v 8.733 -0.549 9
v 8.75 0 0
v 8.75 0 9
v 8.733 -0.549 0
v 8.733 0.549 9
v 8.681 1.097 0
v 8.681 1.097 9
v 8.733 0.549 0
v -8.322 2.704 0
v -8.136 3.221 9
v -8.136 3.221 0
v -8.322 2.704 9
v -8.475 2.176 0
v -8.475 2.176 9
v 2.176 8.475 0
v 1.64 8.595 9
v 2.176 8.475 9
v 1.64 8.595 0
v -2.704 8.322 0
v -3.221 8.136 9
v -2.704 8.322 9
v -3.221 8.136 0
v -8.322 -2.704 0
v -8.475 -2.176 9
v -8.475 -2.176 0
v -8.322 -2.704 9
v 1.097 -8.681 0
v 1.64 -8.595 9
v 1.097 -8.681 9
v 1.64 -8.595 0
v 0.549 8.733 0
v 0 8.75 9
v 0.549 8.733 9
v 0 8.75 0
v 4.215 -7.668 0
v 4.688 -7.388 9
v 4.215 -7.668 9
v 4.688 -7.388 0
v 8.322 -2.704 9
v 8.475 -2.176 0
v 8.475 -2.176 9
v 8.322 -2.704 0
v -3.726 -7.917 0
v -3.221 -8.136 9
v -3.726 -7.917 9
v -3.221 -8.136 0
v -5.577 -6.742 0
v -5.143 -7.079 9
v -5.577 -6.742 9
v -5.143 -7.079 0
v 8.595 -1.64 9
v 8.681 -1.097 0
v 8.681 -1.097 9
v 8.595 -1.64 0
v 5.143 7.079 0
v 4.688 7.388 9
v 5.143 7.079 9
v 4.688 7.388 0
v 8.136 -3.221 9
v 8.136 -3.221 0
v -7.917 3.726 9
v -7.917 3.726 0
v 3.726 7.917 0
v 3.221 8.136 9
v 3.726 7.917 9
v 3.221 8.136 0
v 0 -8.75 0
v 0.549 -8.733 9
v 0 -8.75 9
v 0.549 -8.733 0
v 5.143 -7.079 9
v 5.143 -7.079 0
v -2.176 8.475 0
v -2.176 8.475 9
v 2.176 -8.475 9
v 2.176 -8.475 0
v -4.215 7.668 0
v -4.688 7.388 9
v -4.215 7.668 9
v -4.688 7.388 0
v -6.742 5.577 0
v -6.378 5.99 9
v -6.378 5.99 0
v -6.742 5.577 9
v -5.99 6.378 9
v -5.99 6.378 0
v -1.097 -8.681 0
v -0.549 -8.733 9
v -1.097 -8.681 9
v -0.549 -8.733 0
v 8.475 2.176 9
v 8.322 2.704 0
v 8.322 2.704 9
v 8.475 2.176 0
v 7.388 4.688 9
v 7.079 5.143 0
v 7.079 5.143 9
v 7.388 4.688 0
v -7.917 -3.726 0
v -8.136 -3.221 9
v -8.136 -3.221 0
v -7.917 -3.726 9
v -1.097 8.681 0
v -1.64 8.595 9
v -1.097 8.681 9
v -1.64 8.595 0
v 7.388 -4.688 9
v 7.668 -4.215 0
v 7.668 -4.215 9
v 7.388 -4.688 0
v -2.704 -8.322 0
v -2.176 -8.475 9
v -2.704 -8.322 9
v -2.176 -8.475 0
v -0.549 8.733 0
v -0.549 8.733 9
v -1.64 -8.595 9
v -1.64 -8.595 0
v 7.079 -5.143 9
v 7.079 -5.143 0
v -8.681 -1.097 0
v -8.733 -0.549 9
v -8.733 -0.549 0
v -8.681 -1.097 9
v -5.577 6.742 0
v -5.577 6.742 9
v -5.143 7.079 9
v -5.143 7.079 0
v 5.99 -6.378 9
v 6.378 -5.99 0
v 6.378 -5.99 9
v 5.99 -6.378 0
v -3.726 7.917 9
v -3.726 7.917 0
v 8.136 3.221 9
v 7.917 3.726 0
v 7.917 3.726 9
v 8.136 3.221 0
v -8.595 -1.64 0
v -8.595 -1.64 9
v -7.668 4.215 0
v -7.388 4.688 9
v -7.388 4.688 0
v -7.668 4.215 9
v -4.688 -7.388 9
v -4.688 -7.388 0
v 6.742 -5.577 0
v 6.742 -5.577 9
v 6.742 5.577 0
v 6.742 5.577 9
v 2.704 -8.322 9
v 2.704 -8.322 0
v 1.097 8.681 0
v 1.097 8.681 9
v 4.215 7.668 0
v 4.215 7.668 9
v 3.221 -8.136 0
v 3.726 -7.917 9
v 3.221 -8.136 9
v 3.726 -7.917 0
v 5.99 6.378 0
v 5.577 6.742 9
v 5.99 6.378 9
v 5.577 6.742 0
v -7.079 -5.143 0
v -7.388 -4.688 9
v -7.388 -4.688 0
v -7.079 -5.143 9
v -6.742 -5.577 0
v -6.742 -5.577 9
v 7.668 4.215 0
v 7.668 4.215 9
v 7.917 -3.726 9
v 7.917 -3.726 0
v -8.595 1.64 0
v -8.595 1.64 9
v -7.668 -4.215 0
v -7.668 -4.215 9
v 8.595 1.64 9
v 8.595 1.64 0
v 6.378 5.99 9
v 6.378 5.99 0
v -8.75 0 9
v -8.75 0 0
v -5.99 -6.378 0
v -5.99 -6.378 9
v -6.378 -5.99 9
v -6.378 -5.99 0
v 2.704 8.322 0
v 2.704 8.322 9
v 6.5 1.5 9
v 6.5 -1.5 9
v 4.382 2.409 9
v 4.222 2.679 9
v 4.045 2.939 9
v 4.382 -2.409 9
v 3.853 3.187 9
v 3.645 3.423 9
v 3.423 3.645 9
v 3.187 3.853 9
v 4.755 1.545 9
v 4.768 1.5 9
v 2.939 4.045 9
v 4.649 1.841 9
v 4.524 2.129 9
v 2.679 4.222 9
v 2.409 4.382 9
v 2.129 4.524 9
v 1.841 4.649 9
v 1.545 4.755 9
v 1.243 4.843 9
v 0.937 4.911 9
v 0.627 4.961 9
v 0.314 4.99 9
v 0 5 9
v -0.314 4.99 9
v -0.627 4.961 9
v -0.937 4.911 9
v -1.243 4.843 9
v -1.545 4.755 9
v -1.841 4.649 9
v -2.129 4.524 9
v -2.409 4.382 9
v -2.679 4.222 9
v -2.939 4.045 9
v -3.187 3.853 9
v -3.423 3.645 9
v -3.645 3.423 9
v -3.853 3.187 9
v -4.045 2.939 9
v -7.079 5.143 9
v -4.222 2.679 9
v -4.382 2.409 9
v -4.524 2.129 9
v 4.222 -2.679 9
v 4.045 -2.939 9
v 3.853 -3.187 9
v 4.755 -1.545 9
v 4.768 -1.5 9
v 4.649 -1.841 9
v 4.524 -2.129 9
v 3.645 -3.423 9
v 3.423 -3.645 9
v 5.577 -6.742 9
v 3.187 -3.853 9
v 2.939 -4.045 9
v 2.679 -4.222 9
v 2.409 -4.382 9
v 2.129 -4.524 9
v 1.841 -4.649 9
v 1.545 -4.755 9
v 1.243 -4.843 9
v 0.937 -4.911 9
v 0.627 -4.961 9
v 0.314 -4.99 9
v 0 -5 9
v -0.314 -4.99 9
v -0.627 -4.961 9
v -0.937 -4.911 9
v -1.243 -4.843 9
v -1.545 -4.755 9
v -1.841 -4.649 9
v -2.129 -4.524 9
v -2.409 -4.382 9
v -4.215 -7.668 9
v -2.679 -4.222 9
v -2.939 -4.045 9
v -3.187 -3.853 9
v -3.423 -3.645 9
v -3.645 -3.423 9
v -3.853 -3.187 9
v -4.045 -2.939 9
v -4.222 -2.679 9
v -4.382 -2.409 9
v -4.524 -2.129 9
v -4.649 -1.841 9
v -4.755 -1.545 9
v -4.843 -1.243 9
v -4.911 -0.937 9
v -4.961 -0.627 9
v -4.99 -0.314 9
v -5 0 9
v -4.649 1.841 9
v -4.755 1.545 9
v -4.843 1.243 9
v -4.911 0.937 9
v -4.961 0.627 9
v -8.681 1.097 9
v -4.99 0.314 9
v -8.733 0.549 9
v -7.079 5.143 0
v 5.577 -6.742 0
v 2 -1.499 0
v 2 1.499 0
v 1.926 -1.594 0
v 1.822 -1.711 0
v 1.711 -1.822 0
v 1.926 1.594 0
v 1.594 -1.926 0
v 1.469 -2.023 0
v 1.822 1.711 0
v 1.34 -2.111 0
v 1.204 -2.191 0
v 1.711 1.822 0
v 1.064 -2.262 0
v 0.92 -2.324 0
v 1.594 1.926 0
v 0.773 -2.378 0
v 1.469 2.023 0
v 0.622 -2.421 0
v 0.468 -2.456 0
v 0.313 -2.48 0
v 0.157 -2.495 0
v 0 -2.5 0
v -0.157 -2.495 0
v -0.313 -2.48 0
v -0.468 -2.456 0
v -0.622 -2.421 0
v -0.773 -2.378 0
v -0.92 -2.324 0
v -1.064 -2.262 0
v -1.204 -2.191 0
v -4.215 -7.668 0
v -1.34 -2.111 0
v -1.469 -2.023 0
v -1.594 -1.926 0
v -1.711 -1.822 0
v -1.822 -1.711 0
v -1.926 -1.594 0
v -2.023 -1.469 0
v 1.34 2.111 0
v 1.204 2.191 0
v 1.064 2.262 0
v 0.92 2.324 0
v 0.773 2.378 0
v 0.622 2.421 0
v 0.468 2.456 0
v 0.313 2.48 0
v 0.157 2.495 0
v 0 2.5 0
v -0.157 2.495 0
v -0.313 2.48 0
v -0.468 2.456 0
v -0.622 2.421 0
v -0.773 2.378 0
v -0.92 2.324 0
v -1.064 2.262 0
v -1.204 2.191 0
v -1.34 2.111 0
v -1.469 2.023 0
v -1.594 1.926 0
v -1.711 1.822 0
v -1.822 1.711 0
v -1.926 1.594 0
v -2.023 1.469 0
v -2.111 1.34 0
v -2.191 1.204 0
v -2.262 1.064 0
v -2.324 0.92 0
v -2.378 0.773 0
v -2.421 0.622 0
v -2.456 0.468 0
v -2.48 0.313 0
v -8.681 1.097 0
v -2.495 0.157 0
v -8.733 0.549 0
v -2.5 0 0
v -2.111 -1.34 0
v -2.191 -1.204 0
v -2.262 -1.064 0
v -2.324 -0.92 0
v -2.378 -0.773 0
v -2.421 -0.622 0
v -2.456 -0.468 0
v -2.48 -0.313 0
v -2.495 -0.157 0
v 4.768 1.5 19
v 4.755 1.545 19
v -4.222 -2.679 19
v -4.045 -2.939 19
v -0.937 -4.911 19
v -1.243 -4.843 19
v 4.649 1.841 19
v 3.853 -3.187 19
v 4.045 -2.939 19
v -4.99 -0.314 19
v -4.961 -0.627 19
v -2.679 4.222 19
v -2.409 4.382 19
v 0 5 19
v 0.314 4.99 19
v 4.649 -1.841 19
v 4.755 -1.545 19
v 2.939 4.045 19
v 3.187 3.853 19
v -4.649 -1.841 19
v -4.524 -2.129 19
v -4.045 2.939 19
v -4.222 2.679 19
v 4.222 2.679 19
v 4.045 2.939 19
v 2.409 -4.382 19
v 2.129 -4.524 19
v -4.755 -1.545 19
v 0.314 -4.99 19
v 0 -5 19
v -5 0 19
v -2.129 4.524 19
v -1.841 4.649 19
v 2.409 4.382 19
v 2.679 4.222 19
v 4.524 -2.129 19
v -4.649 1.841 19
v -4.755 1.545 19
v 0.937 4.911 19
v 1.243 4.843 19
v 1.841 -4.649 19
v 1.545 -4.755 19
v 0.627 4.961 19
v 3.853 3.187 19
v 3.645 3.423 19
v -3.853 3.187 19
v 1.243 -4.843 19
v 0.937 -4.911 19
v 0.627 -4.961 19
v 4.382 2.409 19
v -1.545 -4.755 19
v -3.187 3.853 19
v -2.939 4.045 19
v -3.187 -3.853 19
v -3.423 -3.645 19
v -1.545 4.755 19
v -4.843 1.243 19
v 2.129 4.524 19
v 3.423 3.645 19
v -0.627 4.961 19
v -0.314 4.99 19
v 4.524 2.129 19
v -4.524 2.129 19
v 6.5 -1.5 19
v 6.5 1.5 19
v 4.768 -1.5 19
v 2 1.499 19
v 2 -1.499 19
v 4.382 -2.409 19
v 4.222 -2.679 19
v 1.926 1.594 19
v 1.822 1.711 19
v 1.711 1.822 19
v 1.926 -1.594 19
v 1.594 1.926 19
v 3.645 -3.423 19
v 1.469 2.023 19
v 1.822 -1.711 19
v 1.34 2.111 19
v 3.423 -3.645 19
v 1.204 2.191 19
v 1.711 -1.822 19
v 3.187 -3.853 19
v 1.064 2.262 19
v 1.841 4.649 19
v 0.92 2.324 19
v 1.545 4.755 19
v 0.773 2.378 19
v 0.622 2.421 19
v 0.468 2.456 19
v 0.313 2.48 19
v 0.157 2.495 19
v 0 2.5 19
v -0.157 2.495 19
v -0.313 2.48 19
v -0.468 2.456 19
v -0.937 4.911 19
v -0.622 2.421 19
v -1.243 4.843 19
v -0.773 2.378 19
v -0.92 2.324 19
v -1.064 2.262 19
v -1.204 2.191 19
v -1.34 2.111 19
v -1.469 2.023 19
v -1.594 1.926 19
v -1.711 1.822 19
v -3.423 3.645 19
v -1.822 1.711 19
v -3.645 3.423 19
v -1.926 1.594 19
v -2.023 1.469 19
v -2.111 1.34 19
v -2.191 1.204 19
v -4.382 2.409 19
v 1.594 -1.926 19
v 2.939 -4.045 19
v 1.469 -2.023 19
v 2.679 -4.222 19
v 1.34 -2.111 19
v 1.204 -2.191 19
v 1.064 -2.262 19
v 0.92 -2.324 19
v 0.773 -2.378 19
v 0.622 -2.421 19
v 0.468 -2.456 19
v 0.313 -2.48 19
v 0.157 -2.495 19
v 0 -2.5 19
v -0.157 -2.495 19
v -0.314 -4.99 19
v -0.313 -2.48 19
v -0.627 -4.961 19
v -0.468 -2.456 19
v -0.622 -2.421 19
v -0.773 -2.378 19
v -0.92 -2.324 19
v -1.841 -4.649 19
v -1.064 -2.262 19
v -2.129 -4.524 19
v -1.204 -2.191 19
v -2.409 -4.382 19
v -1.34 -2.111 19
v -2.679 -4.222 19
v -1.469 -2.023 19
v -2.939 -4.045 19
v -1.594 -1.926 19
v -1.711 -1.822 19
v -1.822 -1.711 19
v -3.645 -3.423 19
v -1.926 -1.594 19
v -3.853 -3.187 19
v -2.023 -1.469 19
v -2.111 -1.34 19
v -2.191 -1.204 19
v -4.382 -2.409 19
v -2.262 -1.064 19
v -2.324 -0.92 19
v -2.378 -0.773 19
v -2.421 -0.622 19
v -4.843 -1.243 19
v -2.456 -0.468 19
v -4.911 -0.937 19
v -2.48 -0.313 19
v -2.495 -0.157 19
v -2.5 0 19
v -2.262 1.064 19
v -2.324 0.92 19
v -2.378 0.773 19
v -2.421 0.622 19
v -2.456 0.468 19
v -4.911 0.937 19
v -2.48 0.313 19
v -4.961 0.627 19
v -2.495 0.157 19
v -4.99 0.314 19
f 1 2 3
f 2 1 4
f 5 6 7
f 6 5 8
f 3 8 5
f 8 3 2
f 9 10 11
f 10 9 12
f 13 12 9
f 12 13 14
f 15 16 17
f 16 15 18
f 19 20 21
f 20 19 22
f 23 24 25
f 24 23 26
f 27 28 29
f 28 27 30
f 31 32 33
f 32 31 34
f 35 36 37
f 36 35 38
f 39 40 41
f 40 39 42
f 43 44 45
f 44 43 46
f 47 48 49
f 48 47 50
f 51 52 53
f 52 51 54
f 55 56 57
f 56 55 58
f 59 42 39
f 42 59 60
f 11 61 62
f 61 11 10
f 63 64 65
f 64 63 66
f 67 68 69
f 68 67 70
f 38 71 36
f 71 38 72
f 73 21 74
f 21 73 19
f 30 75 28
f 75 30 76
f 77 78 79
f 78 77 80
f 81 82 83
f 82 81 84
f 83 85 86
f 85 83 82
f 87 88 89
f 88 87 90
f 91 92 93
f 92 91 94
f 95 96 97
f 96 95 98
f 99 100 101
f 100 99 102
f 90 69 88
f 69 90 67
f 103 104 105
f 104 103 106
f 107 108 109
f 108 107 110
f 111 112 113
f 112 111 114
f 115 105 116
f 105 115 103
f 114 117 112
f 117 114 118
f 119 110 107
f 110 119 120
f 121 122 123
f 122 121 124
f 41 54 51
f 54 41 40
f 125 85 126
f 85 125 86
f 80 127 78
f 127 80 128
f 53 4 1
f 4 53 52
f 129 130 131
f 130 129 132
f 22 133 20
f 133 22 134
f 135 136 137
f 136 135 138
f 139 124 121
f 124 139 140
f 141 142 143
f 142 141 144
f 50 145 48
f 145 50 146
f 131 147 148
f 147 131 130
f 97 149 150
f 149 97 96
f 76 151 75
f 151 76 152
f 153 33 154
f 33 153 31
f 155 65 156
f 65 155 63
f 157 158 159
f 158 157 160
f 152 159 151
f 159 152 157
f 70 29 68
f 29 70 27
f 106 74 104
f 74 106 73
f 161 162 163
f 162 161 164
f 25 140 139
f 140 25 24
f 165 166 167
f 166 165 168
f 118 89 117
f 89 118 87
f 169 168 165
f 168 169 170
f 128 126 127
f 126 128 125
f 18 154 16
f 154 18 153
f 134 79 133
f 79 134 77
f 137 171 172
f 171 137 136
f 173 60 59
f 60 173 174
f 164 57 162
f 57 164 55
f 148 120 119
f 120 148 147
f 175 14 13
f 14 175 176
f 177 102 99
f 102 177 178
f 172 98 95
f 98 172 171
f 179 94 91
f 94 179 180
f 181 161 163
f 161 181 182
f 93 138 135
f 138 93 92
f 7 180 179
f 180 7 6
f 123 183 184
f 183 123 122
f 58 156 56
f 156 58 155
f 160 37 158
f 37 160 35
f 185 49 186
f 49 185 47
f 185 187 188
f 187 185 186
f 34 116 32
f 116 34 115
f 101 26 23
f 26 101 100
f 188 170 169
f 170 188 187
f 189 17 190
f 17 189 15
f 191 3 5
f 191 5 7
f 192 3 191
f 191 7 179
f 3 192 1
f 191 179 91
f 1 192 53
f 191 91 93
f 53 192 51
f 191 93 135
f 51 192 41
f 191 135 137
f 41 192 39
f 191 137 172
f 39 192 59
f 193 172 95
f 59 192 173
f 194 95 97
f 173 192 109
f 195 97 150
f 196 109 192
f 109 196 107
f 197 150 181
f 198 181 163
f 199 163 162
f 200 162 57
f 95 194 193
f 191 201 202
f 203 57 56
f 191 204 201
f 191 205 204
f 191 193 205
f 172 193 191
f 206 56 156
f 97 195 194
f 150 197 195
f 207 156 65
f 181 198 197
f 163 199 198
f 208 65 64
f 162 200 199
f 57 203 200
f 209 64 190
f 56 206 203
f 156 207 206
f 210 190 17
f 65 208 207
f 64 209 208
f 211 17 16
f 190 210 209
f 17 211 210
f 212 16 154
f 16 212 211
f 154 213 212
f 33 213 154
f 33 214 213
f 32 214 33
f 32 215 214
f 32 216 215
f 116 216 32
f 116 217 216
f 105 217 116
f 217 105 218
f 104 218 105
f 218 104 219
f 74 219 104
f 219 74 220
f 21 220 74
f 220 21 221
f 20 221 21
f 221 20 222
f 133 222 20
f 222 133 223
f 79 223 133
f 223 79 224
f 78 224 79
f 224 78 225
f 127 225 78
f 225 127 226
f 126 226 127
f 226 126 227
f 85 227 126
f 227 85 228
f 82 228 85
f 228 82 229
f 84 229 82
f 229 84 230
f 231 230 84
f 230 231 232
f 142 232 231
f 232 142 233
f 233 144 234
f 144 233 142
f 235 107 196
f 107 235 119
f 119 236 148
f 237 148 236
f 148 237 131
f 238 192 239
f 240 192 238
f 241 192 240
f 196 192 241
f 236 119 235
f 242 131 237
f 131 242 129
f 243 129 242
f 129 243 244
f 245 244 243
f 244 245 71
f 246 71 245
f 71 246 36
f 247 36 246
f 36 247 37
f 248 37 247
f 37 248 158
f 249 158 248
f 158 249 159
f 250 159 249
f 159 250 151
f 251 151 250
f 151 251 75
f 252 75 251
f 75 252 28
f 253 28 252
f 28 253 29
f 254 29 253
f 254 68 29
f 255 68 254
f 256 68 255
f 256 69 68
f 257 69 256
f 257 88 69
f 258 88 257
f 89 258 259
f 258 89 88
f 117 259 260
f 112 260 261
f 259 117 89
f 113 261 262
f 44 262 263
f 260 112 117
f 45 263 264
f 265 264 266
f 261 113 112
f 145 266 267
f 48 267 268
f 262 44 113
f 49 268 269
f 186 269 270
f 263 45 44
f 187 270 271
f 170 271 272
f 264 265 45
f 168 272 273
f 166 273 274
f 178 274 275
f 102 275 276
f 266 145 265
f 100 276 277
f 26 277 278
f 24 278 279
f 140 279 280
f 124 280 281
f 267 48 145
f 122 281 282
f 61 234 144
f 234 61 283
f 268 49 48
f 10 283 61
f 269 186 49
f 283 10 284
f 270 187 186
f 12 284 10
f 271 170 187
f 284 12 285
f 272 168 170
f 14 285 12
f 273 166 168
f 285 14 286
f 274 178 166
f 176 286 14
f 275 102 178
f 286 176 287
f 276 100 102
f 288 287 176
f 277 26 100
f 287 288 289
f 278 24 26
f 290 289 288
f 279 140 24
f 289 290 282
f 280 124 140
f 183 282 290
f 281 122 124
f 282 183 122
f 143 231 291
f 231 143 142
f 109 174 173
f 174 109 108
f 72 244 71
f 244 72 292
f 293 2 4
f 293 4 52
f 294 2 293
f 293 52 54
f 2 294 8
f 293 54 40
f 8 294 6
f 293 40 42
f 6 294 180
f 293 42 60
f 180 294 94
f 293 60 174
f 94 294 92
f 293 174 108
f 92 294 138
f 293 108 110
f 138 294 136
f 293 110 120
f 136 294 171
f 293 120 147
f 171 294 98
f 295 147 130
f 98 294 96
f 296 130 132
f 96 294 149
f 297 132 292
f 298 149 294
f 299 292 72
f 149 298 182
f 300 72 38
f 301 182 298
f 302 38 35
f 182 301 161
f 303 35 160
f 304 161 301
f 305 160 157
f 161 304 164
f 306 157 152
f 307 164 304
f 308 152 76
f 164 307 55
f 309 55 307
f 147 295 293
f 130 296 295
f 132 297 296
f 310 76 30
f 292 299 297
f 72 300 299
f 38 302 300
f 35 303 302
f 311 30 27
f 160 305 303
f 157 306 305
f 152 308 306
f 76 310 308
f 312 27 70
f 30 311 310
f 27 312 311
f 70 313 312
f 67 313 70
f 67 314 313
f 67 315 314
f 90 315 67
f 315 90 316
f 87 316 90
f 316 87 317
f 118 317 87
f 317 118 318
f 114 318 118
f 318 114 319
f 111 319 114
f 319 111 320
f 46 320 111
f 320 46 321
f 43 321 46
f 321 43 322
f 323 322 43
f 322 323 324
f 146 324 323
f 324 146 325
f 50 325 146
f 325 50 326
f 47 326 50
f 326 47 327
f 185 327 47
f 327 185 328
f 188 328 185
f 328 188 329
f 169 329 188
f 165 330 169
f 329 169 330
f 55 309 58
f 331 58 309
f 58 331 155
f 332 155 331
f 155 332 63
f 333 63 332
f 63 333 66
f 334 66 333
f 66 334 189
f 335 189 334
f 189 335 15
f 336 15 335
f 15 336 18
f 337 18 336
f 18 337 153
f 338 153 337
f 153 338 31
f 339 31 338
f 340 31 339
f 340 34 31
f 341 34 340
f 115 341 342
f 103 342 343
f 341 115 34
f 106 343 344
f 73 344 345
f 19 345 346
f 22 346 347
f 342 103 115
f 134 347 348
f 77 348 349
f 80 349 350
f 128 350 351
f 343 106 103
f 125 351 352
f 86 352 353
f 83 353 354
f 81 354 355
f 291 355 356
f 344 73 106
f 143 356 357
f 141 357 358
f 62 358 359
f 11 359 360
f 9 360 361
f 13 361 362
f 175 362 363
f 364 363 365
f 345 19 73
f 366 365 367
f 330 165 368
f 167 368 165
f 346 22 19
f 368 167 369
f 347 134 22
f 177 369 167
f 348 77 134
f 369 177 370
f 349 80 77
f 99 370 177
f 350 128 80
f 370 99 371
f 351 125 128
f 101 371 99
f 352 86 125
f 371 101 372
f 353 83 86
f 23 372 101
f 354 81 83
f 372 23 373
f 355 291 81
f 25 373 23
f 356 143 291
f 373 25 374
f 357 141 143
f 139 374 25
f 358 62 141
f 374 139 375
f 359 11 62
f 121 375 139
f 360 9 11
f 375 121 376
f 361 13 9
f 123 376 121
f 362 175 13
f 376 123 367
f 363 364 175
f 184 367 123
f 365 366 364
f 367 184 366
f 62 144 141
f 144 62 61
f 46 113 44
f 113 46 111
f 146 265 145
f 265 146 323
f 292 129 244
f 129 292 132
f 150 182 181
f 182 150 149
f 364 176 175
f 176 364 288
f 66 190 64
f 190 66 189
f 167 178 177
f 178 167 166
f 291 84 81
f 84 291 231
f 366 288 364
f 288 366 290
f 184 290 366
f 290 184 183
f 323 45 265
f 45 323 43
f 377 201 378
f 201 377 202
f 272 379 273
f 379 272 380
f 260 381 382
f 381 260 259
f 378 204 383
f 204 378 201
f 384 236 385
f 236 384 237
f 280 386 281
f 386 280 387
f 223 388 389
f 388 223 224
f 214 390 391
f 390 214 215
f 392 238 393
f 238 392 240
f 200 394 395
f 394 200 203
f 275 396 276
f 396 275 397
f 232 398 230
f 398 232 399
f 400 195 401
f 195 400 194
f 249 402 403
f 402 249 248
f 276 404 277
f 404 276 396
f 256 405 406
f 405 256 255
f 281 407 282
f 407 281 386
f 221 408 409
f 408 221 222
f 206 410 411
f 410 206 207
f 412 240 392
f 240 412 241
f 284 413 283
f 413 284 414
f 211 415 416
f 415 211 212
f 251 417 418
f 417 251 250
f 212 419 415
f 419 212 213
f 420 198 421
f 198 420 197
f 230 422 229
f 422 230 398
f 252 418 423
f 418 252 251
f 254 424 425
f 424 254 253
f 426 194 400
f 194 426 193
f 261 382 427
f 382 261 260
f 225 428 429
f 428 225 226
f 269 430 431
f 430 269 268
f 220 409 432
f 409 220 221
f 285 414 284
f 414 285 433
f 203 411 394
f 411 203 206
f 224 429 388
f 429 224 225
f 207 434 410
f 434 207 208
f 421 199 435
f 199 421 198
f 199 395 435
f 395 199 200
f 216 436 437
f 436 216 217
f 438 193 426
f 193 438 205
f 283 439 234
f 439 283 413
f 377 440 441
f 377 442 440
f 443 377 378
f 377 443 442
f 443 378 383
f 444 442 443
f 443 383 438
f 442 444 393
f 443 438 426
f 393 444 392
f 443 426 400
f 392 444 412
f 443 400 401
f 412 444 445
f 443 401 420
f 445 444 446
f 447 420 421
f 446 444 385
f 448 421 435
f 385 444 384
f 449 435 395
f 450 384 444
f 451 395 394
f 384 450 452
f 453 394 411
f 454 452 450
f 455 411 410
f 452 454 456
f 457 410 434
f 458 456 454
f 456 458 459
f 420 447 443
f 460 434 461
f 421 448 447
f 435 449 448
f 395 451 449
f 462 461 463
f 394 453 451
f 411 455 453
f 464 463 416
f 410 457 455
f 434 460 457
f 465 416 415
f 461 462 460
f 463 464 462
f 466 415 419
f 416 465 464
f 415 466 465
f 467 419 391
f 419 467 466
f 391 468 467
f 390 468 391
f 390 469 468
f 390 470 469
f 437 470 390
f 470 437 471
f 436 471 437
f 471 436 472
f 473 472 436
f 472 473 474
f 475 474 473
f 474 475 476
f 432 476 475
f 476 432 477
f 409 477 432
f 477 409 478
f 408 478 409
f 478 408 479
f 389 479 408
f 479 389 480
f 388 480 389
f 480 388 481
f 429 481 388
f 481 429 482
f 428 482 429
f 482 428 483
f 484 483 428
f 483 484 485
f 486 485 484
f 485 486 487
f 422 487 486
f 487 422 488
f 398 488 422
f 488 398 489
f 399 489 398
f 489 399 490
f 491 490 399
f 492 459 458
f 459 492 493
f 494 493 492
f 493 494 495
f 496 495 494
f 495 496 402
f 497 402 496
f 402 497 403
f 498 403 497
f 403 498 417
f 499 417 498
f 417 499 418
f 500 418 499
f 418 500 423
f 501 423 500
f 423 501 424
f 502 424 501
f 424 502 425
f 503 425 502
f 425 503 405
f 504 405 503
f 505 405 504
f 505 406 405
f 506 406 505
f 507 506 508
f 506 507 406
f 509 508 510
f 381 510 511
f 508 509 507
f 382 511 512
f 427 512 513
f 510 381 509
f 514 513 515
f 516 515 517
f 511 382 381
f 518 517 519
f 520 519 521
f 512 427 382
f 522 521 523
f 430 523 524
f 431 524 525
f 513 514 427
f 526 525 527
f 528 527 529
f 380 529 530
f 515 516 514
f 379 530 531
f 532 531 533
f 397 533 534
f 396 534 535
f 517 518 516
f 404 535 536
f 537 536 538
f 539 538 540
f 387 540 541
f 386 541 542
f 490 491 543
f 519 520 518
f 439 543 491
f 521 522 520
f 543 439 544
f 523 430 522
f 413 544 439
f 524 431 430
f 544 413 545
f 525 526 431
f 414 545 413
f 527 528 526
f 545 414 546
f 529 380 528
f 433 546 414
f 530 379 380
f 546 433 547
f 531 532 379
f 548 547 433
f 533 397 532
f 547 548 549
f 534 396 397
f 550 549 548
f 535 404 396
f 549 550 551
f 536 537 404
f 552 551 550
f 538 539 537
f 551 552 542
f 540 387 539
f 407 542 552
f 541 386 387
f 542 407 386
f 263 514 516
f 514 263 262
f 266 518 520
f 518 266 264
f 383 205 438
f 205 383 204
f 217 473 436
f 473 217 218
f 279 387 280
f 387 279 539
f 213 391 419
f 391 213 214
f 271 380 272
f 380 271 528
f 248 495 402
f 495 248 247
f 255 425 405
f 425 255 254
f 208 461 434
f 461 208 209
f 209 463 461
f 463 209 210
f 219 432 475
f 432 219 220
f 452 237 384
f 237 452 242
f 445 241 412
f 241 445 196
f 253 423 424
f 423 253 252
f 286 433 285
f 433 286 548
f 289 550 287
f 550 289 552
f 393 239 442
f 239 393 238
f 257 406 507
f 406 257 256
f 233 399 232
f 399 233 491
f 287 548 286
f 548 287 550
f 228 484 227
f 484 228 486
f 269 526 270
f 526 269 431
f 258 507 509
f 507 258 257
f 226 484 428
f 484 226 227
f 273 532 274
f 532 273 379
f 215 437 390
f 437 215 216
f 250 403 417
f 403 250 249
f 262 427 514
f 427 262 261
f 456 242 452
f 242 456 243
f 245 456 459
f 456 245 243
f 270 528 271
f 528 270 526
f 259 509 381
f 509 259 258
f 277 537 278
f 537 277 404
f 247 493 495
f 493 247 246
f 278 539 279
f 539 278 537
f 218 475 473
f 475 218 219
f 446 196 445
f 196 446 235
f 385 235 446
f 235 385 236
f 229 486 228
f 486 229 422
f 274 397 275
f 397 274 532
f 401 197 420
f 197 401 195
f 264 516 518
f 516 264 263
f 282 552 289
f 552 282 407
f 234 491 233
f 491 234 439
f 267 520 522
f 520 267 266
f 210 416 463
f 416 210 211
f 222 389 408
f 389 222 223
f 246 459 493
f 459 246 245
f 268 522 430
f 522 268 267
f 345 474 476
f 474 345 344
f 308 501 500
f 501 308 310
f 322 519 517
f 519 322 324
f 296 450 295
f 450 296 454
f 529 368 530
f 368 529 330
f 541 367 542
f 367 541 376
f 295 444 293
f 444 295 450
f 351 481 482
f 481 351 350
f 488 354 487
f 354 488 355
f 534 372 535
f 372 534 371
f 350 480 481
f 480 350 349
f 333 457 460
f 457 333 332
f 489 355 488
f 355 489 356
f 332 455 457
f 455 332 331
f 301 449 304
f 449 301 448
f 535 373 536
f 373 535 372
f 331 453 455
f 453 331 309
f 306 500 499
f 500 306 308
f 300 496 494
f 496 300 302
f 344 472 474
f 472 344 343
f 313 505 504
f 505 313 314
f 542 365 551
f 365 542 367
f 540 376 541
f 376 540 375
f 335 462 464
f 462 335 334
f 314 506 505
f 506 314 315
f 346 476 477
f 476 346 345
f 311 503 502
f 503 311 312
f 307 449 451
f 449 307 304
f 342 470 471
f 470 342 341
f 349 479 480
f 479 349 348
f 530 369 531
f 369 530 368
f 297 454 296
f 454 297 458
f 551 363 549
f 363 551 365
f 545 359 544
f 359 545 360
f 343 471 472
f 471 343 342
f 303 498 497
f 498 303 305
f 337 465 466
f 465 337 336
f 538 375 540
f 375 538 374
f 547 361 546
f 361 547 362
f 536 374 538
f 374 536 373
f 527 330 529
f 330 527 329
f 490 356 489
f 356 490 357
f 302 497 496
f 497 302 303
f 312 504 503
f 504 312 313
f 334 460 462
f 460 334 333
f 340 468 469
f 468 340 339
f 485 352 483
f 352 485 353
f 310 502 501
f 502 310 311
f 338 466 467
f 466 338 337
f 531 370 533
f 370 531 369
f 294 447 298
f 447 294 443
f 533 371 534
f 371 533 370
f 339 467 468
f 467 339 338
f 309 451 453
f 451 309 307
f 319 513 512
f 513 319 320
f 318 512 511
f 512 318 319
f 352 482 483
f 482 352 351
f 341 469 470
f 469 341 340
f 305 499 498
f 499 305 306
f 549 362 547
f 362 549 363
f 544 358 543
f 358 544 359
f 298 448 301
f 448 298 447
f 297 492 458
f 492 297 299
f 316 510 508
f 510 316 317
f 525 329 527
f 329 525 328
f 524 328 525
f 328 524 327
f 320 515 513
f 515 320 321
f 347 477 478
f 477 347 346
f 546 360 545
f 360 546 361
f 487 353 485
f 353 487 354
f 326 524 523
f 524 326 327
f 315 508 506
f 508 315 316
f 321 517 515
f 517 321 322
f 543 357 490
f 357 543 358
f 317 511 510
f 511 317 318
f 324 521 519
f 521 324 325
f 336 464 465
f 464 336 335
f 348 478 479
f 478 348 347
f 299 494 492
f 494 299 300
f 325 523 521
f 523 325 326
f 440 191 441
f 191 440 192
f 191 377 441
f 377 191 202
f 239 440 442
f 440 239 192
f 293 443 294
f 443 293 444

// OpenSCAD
width = 19;         // Overall width
spacerD = 17.5;     // Diameter of spacer
spacerW = 9;        // Width of spacer
feeder = 10;        // Internal Diameter of feeder
keyW = 3;           // Width of inside key
keyH = 1.5;         // Height of inside key
spindle = 5;        // Diameter of spindle

$fn=100;            // set number of faces

difference () {
    union() {
        cylinder(r=spacerD/2, h=spacerW);
        cylinder(r=feeder/2, h=width);
    }
    translate([0,0,-1]) cylinder(r=spindle/2, h=width+2);
}
translate([(feeder/2)-keyH,-(keyW/2),0]) cube([keyH*2,keyW,width]);
translate([2,-(spindle/2),0]) cube([2,spindle,width]);
